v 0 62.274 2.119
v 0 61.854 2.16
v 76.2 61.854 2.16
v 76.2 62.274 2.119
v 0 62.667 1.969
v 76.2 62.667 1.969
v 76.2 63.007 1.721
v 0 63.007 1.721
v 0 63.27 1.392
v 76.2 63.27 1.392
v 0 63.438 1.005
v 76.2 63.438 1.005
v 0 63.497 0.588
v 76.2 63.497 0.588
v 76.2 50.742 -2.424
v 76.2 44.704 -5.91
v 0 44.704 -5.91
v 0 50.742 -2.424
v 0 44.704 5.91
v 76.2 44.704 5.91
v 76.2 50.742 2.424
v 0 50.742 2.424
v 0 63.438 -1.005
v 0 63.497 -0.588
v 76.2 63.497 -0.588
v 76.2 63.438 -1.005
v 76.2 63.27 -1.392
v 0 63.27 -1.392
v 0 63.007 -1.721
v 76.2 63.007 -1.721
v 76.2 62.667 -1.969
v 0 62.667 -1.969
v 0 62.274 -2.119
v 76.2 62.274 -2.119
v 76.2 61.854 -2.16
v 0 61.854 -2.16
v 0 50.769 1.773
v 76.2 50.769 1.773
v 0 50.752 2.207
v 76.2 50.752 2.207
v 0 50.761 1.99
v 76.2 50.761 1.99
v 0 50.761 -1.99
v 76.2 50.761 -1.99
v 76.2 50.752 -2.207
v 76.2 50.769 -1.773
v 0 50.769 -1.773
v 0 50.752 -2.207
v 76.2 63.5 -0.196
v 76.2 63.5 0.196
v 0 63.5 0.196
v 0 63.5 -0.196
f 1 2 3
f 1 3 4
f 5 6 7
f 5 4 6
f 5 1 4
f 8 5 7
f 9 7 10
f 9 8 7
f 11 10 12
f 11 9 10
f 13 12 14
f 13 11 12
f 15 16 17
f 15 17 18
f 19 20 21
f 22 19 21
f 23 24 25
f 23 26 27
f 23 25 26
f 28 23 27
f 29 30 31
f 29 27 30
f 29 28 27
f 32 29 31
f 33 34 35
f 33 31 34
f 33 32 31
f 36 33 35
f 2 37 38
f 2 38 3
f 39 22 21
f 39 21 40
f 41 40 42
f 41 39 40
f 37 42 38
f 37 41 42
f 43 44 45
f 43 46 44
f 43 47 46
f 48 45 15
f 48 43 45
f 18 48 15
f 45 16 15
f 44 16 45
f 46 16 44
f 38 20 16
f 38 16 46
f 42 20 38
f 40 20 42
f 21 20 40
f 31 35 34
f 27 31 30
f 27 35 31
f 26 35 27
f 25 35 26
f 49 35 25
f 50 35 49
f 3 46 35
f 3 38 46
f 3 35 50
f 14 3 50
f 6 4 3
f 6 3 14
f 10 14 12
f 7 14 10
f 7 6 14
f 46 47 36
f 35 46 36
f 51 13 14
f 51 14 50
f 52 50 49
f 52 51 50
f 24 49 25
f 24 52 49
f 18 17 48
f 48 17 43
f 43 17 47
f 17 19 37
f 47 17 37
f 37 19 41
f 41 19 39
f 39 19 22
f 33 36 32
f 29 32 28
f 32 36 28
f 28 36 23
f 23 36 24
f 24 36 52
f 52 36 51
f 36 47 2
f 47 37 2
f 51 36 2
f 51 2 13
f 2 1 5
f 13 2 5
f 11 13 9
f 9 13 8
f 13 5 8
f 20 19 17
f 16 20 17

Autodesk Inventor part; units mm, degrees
ref_plane "YZ Plane" through (0, 0, 0) normal (1, 0, 0) x (0, 1, 0)
ref_plane "XZ Plane" through (0, 0, 0) normal (0, 1, 0) x (-1, 0, 0)
ref_plane "XY Plane" through (0, 0, 0) normal (0, 0, 1) x (1, 0, 0)
sketch "Sketch1" plane through (0, 0, 0) normal (1, 0, 0) x (0, 1, 0)
  arc A0 (63.4973, -0.5882) -> (63.4973, 0.5882) centre (0, 0) ccw
  line L0 (50.7691, -1.7729) -> (61.8544, -2.16)
  line L1 (50.7691, 1.7729) -> (61.8544, 2.16)
  arc A1 (63.4973, 0.5882) -> (61.8544, 2.16) centre (61.9098, 0.5735) ccw
  arc A2 (61.8544, -2.16) -> (63.4973, -0.5882) centre (61.9098, -0.5735) ccw
  arc A3 (2.7261, 50.7268) -> (-2.7261, 50.7268) centre (0, 0) ccw
  line L2 (44.704, 5.9101) -> (44.704, -5.9101)
  line L3 (44.704, 5.9101) -> (50.7421, 2.4239)
  line L4 (44.704, -5.9101) -> (50.7421, -2.4239)
  arc A4 (50.7421, -2.4239) -> (50.7691, -1.7729) centre (0, 0) ccw
  arc A5 (50.7691, 1.7729) -> (50.7421, 2.4239) centre (0, 0) ccw
  line L5 (63.5, 0) -> (73.7693, 0) construction
  point P0 (63.4613, -2.2161)
  point P1 (63.4613, 2.2161)
  point P2 (50.7268, -2.7261)
  dimension "d9" = 1.5875
extrude "Extrusion1" add sketch "Sketch1" along normal blind 76.2
properties part number "220525 Notch 0.5 inch"
